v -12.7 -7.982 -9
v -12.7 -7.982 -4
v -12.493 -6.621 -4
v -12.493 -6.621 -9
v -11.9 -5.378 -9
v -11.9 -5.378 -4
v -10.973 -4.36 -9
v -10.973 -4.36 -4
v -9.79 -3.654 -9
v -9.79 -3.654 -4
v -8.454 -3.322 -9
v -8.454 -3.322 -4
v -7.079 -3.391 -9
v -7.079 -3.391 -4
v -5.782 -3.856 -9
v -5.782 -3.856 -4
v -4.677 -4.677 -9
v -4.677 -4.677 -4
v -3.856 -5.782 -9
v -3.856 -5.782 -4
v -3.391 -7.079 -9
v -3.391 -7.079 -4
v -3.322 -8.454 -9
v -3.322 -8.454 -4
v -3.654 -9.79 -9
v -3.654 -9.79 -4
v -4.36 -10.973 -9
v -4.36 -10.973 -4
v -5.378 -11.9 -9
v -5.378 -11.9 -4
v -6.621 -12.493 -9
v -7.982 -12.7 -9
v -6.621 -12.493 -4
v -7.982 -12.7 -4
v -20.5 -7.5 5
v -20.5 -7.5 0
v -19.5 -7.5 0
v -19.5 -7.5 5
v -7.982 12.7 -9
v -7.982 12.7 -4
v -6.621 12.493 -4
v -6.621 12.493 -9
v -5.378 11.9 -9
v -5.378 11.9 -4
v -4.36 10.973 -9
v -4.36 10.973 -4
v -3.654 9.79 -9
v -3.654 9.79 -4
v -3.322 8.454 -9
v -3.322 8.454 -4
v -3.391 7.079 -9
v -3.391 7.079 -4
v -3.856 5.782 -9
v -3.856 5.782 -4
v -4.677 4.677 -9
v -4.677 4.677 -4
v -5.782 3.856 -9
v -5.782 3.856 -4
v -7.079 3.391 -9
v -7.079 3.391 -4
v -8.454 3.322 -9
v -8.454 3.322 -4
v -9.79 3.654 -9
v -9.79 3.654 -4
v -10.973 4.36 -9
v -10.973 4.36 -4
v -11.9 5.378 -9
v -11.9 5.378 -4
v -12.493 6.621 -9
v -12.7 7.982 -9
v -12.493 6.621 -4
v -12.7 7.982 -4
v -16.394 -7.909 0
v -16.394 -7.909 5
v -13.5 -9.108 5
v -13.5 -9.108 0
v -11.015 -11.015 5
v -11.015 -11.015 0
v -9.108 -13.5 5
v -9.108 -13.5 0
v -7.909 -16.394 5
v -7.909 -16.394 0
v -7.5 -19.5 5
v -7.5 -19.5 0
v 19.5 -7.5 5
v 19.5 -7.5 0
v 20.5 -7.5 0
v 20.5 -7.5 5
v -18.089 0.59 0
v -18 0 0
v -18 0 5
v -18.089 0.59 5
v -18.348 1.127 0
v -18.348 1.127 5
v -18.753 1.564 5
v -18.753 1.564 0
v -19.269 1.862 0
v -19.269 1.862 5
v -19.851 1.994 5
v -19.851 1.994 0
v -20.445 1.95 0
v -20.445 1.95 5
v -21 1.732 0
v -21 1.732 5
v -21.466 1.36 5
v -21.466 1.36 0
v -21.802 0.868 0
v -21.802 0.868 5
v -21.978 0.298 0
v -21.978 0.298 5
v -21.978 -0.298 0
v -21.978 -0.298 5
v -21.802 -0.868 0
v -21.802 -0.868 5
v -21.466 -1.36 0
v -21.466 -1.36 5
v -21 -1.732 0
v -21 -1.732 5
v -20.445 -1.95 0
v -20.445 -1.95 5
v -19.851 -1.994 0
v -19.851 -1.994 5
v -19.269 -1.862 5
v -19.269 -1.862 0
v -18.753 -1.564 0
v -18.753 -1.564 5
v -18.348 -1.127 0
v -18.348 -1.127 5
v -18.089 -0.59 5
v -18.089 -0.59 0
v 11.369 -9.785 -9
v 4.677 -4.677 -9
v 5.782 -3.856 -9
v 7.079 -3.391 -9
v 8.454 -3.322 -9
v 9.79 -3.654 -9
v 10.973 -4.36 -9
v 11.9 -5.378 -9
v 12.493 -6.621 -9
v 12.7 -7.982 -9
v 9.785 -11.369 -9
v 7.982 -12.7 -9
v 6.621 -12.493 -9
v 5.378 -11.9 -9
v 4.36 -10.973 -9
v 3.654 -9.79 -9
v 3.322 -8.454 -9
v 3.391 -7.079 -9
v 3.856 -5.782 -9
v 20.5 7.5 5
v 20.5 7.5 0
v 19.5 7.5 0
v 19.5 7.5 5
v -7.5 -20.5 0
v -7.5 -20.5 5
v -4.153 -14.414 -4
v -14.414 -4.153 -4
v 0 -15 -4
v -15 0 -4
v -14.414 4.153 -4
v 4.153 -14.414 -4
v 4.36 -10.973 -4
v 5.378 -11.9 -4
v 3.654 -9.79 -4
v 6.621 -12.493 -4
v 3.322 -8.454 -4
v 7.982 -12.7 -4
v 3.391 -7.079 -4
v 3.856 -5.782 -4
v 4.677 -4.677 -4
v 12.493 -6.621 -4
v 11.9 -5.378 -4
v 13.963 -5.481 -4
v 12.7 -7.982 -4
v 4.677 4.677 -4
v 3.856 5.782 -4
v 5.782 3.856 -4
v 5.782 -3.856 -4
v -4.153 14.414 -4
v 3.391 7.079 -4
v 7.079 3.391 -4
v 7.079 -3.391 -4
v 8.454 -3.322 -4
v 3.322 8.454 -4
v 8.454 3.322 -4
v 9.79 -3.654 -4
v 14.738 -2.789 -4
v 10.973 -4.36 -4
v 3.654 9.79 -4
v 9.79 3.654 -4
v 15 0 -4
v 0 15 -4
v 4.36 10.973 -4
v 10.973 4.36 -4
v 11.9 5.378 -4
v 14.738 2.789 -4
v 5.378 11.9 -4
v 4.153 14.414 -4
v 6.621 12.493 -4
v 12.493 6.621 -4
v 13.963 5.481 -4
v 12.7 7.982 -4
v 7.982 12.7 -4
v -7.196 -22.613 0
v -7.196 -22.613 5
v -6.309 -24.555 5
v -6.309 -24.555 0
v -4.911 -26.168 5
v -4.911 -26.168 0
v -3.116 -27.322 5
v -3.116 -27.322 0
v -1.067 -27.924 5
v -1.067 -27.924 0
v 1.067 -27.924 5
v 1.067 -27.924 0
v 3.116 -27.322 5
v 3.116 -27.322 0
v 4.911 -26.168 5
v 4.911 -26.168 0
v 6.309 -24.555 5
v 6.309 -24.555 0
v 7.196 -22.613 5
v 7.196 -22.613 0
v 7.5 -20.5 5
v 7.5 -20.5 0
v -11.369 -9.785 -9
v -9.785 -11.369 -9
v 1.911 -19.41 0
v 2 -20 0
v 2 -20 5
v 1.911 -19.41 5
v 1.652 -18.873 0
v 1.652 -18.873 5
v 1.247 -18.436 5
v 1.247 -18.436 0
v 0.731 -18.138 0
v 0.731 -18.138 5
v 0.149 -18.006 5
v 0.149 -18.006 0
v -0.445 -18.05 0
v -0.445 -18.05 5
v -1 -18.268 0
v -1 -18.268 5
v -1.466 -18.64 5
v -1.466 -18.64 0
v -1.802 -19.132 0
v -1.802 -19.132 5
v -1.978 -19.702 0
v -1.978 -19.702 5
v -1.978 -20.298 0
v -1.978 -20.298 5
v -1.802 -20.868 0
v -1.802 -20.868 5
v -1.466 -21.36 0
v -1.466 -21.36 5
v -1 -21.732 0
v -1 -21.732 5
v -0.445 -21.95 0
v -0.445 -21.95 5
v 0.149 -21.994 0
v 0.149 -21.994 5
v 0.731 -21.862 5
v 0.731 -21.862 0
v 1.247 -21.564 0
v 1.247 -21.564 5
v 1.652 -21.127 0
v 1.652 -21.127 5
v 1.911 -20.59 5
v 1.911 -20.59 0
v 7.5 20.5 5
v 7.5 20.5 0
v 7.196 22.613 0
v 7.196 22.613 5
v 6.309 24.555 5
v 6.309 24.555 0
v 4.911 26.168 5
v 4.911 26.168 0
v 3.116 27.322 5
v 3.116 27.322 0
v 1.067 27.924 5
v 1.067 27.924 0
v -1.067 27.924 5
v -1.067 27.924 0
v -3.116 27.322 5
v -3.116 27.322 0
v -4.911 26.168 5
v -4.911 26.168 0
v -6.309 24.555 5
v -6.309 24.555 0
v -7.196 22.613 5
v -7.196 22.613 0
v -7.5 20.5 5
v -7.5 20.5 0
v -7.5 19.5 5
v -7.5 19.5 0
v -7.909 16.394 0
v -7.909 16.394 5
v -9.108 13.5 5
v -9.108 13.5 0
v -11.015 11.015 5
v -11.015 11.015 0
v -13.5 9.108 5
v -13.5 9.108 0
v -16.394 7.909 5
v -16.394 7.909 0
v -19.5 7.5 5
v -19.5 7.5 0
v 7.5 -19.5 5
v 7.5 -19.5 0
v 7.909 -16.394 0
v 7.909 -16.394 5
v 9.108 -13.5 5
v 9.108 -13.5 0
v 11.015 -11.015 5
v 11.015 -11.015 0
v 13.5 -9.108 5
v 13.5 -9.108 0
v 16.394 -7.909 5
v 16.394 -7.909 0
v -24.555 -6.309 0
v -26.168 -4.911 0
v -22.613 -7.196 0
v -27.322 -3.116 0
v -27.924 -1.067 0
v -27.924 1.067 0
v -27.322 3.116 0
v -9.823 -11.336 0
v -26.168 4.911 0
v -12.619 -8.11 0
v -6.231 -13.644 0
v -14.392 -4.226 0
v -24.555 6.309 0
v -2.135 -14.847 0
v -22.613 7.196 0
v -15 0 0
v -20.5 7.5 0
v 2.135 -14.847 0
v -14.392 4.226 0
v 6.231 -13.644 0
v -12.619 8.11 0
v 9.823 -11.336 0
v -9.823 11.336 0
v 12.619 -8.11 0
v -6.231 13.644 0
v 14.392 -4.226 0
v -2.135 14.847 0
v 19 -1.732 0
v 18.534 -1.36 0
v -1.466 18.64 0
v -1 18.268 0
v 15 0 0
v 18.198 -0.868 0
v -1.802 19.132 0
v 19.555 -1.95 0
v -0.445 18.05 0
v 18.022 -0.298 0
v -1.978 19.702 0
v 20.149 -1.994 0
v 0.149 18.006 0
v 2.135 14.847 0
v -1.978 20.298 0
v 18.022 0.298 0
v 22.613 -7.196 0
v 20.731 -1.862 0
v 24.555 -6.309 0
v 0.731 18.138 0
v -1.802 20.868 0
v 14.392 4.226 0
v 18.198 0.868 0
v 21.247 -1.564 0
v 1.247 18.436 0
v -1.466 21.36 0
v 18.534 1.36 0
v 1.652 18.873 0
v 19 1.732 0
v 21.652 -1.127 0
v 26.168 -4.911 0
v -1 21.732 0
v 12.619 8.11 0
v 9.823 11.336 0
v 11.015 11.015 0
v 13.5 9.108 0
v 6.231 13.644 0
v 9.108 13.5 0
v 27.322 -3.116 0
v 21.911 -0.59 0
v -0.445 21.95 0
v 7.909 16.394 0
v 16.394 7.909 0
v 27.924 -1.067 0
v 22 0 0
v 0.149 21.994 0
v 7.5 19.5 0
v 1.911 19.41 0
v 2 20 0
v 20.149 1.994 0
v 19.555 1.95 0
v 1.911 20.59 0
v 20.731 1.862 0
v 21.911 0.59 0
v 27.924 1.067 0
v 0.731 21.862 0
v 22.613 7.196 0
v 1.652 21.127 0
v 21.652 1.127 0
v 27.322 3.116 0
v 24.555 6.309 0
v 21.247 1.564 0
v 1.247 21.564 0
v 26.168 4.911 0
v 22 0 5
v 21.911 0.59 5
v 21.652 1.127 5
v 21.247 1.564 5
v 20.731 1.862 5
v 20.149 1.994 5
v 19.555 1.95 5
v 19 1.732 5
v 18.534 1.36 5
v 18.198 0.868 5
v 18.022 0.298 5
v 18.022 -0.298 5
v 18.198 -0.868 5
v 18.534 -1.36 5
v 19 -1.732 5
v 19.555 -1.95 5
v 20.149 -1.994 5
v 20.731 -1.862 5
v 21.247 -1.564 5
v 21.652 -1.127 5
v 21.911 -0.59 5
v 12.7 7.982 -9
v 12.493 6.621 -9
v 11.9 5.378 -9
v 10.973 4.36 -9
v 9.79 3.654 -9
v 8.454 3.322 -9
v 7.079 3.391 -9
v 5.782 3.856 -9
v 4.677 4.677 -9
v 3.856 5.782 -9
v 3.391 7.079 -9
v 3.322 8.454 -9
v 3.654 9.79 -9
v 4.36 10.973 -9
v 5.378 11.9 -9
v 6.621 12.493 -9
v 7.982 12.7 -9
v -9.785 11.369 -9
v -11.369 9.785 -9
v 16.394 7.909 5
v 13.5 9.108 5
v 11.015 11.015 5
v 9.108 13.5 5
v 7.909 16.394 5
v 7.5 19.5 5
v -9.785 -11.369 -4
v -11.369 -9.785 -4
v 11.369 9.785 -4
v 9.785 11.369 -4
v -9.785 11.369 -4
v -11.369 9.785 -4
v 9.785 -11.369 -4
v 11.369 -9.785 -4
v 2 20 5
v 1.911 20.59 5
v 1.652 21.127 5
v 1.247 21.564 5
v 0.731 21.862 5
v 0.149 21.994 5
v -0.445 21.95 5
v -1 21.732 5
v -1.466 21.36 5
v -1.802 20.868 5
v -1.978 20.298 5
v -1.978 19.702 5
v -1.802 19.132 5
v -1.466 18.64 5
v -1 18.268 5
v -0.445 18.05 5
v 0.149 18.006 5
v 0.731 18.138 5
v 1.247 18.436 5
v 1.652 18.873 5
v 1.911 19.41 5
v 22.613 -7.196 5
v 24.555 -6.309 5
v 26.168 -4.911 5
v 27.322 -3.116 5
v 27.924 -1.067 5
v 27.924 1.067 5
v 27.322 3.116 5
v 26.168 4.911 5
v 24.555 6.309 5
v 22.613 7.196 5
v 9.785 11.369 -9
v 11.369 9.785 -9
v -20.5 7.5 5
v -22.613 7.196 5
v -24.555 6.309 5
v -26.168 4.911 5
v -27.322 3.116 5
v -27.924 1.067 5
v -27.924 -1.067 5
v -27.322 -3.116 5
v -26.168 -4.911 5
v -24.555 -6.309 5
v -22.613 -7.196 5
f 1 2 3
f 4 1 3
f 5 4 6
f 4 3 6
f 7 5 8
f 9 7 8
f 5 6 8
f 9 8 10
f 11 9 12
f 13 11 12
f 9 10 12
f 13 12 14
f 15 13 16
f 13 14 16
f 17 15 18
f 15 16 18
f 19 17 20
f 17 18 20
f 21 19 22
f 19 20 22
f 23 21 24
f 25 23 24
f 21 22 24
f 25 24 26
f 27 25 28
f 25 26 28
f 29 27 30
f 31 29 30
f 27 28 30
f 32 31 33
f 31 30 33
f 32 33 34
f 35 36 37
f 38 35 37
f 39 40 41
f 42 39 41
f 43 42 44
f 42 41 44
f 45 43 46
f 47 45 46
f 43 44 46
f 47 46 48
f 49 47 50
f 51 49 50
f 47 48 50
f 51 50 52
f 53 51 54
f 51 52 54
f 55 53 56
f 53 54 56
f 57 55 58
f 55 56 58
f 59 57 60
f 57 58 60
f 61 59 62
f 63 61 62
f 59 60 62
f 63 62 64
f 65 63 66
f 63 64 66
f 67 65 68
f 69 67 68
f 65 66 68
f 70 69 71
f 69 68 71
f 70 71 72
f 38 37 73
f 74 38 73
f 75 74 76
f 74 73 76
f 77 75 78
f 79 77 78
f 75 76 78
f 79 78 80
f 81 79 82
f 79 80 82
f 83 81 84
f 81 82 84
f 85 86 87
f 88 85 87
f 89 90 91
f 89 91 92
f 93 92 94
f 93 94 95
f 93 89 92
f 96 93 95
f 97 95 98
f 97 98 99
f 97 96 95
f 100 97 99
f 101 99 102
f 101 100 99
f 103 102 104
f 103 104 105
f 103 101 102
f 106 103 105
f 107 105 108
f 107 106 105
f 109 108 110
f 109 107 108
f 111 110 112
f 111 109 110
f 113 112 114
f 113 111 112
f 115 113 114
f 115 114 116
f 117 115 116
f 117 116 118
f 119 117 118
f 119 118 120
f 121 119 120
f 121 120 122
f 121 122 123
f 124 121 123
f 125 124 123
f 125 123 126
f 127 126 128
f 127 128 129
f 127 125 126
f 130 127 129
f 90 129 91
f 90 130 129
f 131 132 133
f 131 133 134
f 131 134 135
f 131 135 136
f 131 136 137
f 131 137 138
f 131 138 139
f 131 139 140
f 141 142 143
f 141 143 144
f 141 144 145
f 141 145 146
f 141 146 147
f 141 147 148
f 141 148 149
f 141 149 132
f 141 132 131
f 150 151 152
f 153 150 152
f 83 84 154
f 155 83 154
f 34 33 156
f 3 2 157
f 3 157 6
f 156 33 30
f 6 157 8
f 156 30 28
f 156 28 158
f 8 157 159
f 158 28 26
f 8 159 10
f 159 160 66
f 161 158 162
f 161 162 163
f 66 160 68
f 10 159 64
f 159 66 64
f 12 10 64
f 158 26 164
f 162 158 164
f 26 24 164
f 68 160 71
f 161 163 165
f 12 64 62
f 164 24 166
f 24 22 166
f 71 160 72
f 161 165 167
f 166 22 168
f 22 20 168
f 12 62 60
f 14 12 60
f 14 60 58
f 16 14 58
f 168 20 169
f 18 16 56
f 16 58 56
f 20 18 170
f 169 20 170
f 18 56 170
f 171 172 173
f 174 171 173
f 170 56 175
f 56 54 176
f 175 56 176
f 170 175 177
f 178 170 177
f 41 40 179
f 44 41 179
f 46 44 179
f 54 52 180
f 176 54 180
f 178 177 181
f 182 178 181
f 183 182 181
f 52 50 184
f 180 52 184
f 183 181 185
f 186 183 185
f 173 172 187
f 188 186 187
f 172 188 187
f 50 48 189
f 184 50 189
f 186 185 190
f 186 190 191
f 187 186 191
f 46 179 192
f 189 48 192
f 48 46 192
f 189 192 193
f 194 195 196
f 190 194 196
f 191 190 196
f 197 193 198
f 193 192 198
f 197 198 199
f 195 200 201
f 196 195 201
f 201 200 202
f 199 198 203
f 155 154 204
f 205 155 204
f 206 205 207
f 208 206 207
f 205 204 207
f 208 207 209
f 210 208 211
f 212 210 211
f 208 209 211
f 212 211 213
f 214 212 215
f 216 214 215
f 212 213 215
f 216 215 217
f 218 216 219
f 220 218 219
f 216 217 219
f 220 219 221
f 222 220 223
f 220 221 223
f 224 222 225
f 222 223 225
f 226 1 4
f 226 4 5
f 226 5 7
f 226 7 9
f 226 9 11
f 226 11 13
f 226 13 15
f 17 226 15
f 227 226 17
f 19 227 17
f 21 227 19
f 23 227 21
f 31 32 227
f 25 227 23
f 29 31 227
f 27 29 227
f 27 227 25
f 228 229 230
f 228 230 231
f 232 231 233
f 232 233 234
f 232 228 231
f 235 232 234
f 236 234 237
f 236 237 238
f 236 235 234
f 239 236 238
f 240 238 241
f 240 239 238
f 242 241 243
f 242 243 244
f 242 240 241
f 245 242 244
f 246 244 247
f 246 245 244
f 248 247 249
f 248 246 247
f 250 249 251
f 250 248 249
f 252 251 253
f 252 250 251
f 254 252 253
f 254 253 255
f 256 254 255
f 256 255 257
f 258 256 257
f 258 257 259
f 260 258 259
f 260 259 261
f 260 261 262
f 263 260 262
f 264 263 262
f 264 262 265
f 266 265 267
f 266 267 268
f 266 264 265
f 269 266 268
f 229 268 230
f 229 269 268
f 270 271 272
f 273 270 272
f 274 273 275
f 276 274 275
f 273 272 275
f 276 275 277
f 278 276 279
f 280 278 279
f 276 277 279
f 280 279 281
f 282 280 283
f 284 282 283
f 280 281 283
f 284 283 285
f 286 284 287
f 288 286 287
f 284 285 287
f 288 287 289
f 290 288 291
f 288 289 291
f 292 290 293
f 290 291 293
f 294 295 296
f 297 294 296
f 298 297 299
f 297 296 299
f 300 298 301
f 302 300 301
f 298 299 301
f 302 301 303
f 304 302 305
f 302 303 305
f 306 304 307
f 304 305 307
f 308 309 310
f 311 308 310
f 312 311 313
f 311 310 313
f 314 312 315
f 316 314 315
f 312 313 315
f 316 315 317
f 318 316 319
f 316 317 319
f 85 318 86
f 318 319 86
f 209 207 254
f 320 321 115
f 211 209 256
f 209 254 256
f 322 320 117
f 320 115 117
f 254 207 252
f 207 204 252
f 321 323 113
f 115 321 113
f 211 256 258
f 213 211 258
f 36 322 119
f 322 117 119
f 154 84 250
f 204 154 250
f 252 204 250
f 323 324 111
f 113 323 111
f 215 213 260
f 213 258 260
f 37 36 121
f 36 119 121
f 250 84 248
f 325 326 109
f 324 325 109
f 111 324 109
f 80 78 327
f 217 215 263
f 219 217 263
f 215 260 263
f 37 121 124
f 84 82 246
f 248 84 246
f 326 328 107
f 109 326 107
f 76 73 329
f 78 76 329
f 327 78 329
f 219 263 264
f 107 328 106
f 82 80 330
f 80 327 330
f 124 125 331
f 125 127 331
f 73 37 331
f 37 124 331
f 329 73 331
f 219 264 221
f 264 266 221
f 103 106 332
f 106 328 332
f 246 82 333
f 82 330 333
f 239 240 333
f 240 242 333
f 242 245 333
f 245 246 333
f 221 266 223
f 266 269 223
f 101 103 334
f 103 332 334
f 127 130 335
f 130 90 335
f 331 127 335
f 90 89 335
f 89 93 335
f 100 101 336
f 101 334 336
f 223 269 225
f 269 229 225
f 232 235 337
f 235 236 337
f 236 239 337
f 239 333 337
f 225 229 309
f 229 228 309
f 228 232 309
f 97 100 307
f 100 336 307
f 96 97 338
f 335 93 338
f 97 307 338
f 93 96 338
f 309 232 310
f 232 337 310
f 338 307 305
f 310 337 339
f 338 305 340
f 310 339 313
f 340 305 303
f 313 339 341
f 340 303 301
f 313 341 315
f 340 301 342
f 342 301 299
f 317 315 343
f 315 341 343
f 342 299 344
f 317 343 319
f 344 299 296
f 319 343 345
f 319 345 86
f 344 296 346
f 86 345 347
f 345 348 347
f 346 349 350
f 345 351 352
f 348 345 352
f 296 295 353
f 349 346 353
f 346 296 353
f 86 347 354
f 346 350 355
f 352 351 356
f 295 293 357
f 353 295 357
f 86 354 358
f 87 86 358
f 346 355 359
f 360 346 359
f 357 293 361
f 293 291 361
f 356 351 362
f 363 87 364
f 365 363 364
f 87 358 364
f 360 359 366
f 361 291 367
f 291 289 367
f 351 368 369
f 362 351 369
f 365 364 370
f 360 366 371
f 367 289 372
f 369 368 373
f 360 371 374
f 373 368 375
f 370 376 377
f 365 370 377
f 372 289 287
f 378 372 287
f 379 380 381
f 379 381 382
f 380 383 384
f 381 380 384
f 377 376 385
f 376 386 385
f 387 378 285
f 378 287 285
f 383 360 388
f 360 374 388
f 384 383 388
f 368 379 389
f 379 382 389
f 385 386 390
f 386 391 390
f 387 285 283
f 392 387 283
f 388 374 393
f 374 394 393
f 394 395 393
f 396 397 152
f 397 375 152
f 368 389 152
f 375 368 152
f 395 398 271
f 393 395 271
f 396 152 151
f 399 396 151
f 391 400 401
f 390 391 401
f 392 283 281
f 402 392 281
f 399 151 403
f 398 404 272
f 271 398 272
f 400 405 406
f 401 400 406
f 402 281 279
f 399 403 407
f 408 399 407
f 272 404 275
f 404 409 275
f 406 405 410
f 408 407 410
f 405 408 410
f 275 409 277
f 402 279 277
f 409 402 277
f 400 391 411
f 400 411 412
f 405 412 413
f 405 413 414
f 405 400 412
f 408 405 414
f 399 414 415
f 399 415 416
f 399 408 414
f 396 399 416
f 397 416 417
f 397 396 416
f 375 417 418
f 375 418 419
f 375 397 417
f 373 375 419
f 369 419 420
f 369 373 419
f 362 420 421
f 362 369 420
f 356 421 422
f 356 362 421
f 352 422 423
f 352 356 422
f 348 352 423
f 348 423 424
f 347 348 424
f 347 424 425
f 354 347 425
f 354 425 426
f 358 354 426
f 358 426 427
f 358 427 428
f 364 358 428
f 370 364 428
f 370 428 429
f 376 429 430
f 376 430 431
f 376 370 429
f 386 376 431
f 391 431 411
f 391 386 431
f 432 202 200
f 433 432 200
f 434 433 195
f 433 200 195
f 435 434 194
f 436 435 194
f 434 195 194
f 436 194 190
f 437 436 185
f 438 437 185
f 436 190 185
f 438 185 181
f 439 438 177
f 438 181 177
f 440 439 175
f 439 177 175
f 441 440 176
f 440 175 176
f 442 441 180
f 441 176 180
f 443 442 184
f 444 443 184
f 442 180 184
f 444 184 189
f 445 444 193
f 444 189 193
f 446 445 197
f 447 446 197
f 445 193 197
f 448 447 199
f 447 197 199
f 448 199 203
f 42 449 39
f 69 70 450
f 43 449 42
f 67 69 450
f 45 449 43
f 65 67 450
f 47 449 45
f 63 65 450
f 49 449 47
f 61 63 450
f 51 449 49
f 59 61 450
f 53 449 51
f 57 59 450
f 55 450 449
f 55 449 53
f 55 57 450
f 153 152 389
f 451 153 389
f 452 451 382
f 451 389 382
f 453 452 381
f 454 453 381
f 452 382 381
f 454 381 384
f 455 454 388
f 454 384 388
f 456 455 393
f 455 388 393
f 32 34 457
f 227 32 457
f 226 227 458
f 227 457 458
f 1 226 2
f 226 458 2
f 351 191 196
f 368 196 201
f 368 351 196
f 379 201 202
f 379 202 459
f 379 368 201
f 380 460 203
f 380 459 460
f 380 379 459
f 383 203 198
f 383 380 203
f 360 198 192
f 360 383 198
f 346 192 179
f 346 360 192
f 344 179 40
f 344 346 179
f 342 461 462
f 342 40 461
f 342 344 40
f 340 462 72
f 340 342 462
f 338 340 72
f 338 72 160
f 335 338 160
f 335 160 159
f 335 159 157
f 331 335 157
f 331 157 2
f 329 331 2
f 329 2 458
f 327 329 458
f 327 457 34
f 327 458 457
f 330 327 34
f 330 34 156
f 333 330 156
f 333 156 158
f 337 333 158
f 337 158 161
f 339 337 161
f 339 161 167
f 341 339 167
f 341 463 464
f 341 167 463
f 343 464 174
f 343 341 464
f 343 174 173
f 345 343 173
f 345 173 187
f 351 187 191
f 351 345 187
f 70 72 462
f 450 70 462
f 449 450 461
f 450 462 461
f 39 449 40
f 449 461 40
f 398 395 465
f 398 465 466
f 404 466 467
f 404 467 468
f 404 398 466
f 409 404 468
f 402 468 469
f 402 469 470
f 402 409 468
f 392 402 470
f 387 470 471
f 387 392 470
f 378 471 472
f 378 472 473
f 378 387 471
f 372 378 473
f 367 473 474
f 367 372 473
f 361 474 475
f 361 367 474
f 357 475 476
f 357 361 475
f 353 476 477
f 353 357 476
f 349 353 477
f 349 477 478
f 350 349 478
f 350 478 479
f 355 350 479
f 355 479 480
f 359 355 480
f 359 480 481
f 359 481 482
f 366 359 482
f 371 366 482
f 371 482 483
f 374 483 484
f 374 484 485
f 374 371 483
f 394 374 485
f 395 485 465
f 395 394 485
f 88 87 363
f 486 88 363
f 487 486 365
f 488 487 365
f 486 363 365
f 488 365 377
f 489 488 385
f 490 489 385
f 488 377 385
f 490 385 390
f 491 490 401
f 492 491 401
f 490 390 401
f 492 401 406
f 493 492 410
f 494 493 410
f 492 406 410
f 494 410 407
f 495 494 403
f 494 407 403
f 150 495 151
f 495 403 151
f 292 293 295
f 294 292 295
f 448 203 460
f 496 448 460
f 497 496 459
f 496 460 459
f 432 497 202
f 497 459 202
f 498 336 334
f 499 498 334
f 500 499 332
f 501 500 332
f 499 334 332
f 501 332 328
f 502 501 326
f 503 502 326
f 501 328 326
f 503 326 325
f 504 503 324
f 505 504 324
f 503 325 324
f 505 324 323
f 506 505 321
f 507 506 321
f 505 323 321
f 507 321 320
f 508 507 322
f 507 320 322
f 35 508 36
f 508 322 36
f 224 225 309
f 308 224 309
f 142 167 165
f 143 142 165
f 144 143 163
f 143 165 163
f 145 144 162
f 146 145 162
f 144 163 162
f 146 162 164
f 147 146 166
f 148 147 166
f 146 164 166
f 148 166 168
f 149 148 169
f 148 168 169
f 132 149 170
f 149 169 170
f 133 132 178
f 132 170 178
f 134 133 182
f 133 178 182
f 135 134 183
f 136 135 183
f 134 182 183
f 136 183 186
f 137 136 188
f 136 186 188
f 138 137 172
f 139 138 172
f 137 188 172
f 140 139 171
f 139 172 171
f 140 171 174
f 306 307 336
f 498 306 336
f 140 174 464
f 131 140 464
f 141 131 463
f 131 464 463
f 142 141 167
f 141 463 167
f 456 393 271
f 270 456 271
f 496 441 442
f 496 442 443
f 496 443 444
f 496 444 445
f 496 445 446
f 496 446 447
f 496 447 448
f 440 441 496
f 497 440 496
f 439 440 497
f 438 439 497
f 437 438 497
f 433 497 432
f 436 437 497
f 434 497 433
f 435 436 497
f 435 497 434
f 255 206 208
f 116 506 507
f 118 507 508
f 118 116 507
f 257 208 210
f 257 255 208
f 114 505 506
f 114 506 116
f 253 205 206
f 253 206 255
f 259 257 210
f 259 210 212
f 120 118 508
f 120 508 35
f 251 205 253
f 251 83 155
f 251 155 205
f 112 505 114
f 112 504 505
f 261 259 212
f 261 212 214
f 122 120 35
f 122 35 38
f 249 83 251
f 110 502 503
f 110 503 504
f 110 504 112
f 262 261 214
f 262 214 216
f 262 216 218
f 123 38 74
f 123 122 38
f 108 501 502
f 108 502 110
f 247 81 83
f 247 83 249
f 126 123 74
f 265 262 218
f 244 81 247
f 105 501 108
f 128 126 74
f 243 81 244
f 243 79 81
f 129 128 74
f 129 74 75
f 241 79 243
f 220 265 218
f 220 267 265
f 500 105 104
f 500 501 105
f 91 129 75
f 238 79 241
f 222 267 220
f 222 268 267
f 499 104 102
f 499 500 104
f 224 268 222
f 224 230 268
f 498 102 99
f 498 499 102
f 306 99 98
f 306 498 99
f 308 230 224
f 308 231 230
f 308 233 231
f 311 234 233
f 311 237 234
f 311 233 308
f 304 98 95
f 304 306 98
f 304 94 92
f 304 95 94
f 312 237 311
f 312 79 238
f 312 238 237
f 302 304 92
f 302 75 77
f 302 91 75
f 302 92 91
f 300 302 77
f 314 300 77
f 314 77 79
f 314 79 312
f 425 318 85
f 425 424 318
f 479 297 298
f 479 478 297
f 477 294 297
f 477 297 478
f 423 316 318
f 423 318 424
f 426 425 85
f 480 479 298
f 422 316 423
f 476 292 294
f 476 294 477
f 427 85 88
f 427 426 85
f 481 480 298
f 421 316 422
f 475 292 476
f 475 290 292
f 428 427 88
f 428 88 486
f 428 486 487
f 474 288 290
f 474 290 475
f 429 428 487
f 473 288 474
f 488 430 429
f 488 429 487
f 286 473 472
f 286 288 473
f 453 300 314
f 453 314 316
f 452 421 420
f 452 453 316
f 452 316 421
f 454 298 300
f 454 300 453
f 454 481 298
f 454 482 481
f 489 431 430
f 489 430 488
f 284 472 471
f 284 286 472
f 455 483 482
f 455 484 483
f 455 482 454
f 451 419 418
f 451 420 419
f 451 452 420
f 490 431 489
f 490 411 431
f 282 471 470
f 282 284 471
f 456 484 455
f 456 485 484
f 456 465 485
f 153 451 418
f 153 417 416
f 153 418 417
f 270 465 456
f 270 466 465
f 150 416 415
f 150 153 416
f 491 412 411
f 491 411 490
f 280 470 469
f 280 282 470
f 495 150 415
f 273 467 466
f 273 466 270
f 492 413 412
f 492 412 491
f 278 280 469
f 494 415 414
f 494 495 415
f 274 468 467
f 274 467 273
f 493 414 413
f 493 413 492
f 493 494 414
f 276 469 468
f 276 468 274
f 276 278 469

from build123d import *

# Parameters (mm, degrees)
F0_R     = 2
F1_DEPTH = 5
F2_R     = 15
F3_DEPTH = 4
F5_DEPTH = 5


# Not quite as in the source:
# - after a boolean that leaves OpenCascade's solid faulty, fix() repairs it


with BuildPart() as f1:
    # F0 (on Top) → F1 (new body)
    with BuildSketch(Plane.XY):
        with BuildLine():
            ThreePointArc((0, 28), (-5.3033008589, 25.8033008589), (-7.5, 20.5))
            Line((-7.5, 20.5), (-7.5, 19.5))
            ThreePointArc((-7.5, 19.5), (-11.0147186258, 11.0147186258), (-19.5, 7.5))
            Line((-19.5, 7.5), (-20.5, 7.5))
            ThreePointArc((-20.5, 7.5), (-25.8033008589, 5.3033008589), (-28, 0))
            ThreePointArc((-28, 0), (-25.8033008589, -5.3033008589), (-20.5, -7.5))
            Line((-20.5, -7.5), (-19.5, -7.5))
            ThreePointArc((-19.5, -7.5), (-11.0147186258, -11.0147186258), (-7.5, -19.5))
            Line((-7.5, -19.5), (-7.5, -20.5))
            ThreePointArc((-7.5, -20.5), (-5.3033008589, -25.8033008589), (0, -28))
            ThreePointArc((0, -28), (5.3033008589, -25.8033008589), (7.5, -20.5))
            Line((7.5, -20.5), (7.5, -19.5))
            ThreePointArc((7.5, -19.5), (11.0147186258, -11.0147186258), (19.5, -7.5))
            Line((19.5, -7.5), (20.5, -7.5))
            ThreePointArc((20.5, -7.5), (25.8033008589, -5.3033008589), (28, 0))
            ThreePointArc((28, 0), (25.8033008589, 5.3033008589), (20.5, 7.5))
            Line((20.5, 7.5), (19.5, 7.5))
            ThreePointArc((19.5, 7.5), (11.0147186258, 11.0147186258), (7.5, 19.5))
            Line((7.5, 19.5), (7.5, 20.5))
            ThreePointArc((7.5, 20.5), (5.3033008589, 25.8033008589), (0, 28))
        make_face()
        with Locations((0, -20)):
            Circle(F0_R, mode=Mode.SUBTRACT)
        with Locations((-20, 0)):
            Circle(F0_R, mode=Mode.SUBTRACT)
        with Locations((20, 0)):
            Circle(F0_R, mode=Mode.SUBTRACT)
        with Locations((0, 20)):
            Circle(F0_R, mode=Mode.SUBTRACT)
    extrude(amount=F1_DEPTH)

    # F2 (on Top) → F3 (join)
    with BuildSketch(Plane.XY):
        Circle(F2_R)
    extrude(amount=-F3_DEPTH)

    # F4 (on face) → F5 (join)
    with BuildSketch(Plane(origin=(0, 0, -4), x_dir=(1, 0, 0), z_dir=(0, 0, -1))):
        with BuildLine():
            ThreePointArc((-7.9819098145, 12.6999651855), (-10.6066017178, 10.6066017178), (-12.6999651855, 7.9819098145))
            ThreePointArc((-12.6999651855, 7.9819098145), (-4.6765981284, 4.6765981284), (-7.9819098145, 12.6999651855))
        make_face()
        with BuildLine():
            ThreePointArc((12.6999651855, 7.9819098145), (10.6066017178, 10.6066017178), (7.9819098145, 12.6999651855))
            ThreePointArc((7.9819098145, 12.6999651855), (4.6765981284, 4.6765981284), (12.6999651855, 7.9819098145))
        make_face()
        with BuildLine():
            ThreePointArc((7.9819098145, -12.6999651855), (10.6066017178, -10.6066017178), (12.6999651855, -7.9819098145))
            ThreePointArc((12.6999651855, -7.9819098145), (4.6765981284, -4.6765981284), (7.9819098145, -12.6999651855))
        make_face()
        with BuildLine():
            ThreePointArc((-12.6999651855, -7.9819098145), (-10.6066017178, -10.6066017178), (-7.9819098145, -12.6999651855))
            ThreePointArc((-7.9819098145, -12.6999651855), (-4.6765981284, -4.6765981284), (-12.6999651855, -7.9819098145))
        make_face()
    extrude(amount=F5_DEPTH)

    add(f1.part.fix(), mode=Mode.REPLACE)


solid = f1.part
